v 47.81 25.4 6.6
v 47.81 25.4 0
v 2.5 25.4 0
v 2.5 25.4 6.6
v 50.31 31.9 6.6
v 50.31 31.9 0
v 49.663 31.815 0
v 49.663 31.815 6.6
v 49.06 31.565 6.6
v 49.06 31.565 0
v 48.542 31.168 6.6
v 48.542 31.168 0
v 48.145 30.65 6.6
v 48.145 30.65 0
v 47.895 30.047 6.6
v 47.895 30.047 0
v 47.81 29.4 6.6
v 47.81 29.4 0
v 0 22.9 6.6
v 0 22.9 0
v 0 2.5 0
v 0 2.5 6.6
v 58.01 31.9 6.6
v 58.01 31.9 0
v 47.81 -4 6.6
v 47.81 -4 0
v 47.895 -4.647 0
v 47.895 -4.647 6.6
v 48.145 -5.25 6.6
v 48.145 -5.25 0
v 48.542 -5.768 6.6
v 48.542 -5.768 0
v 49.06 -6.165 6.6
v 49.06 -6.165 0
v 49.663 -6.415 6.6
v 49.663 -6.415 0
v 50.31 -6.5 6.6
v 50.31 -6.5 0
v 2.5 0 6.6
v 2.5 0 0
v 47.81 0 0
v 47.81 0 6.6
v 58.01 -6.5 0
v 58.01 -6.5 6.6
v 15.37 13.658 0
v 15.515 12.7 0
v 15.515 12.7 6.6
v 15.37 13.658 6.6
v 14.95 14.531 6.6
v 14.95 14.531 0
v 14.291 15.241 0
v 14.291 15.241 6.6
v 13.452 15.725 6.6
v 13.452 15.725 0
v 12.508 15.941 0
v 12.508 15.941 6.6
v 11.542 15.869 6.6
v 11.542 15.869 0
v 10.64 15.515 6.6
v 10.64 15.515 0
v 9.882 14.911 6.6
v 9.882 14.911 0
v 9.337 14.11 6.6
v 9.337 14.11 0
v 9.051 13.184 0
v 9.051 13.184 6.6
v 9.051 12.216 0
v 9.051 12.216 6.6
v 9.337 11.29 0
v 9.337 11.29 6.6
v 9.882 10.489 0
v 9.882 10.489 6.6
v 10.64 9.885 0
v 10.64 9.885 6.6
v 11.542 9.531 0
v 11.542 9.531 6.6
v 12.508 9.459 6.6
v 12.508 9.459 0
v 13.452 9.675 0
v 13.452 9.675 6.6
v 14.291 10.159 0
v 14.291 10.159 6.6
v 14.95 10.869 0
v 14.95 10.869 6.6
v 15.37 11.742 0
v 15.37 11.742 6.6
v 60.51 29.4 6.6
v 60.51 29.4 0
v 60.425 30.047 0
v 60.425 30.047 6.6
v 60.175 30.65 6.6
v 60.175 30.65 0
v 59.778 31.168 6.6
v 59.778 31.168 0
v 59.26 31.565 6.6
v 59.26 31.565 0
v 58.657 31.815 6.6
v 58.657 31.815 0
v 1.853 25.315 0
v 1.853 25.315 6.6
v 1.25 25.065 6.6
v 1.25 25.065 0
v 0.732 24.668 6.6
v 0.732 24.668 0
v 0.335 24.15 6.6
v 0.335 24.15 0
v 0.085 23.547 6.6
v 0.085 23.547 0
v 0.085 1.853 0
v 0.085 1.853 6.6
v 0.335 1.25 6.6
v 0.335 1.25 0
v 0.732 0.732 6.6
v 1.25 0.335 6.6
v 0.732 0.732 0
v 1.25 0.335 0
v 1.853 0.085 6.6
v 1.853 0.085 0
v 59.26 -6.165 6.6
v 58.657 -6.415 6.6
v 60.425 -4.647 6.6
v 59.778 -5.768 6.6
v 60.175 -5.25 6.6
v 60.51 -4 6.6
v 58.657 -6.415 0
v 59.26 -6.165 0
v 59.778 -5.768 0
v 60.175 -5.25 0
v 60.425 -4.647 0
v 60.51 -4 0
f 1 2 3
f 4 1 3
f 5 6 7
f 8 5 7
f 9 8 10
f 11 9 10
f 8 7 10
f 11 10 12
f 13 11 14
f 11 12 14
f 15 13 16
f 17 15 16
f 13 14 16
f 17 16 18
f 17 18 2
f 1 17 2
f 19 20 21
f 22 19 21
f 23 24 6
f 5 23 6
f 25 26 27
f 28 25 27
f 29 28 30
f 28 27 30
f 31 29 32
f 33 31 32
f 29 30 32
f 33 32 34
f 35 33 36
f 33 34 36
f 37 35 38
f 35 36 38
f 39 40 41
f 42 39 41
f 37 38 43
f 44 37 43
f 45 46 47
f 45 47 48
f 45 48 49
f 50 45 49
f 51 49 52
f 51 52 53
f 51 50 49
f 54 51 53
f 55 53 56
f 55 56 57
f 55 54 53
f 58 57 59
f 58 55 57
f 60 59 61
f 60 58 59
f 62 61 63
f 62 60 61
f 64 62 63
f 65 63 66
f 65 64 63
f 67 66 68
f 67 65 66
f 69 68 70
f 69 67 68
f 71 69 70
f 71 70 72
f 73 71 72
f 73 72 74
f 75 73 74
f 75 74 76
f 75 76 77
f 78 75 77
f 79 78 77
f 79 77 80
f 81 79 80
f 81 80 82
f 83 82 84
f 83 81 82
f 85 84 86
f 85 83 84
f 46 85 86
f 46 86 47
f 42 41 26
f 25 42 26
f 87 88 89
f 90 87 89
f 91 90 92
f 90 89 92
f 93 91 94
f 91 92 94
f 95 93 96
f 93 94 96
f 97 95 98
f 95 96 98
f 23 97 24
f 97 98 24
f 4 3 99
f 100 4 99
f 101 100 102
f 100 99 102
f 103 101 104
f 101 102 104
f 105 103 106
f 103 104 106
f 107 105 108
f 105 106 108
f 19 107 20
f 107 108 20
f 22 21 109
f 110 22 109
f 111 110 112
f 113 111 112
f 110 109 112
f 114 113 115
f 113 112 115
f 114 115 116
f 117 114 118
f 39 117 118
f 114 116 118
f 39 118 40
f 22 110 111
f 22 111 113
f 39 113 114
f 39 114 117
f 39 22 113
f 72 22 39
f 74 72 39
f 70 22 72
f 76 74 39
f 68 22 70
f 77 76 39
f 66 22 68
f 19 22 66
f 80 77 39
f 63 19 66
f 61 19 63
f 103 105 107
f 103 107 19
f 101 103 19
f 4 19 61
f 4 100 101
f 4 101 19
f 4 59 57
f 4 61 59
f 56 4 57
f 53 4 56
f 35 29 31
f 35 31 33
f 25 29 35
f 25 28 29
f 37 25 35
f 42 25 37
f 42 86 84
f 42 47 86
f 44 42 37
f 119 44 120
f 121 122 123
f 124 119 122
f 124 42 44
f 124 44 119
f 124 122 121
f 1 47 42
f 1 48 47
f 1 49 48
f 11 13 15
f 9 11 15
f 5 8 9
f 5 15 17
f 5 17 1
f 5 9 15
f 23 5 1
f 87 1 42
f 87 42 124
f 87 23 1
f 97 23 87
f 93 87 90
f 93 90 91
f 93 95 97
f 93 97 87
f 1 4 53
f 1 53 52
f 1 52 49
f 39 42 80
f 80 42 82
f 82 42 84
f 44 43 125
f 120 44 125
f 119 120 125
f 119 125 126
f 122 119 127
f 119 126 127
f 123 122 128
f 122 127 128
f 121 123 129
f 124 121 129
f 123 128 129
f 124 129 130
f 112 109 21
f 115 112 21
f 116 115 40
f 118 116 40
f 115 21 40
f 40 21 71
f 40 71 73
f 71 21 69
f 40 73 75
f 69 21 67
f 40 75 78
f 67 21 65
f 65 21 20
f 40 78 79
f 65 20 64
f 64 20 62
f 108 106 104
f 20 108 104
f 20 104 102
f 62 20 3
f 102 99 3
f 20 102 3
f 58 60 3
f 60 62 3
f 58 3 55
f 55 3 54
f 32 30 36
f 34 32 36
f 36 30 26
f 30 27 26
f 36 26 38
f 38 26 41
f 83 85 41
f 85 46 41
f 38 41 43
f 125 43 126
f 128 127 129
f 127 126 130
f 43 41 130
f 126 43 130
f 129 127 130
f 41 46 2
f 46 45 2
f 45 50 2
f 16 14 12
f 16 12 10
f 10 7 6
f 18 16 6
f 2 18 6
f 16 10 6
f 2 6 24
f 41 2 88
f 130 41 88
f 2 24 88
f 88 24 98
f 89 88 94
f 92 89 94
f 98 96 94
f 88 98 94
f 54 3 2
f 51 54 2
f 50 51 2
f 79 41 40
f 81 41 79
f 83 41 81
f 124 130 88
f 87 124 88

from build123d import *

# Parameters (mm, degrees)
MODEL_R             = 3.25
BOSS_EXTRUDE1_DEPTH = 6.6


with BuildPart() as part:
    # Model → Boss-Extrude1 (new body)
    with BuildSketch(Plane.XY):
        with BuildLine():
            Line((58.01, 31.9), (50.31, 31.9))
            ThreePointArc((50.31, 31.9), (48.542233047, 31.167766953), (47.81, 29.4))
            Line((47.81, 29.4), (47.81, 25.4))
            Line((47.81, 25.4), (2.5, 25.4))
            ThreePointArc((2.5, 25.4), (0.732233047, 24.667766953), (0, 22.9))
            Line((0, 22.9), (0, 2.5))
            ThreePointArc((0, 2.5), (0.732233047, 0.732233047), (2.5, 0))
            Line((2.5, 0), (47.81, 0))
            Line((47.81, 0), (47.81, -4))
            ThreePointArc((47.81, -4), (48.542233047, -5.767766953), (50.31, -6.5))
            Line((50.31, -6.5), (58.01, -6.5))
            ThreePointArc((58.01, -6.5), (59.777766953, -5.767766953), (60.51, -4))
            Line((60.51, -4), (60.51, 29.4))
            ThreePointArc((60.51, 29.4), (59.777766953, 31.167766953), (58.01, 31.9))
        make_face()
        with Locations((12.264807358, 12.7)):
            Circle(MODEL_R, mode=Mode.SUBTRACT)
    extrude(amount=BOSS_EXTRUDE1_DEPTH)


solid = part.part
